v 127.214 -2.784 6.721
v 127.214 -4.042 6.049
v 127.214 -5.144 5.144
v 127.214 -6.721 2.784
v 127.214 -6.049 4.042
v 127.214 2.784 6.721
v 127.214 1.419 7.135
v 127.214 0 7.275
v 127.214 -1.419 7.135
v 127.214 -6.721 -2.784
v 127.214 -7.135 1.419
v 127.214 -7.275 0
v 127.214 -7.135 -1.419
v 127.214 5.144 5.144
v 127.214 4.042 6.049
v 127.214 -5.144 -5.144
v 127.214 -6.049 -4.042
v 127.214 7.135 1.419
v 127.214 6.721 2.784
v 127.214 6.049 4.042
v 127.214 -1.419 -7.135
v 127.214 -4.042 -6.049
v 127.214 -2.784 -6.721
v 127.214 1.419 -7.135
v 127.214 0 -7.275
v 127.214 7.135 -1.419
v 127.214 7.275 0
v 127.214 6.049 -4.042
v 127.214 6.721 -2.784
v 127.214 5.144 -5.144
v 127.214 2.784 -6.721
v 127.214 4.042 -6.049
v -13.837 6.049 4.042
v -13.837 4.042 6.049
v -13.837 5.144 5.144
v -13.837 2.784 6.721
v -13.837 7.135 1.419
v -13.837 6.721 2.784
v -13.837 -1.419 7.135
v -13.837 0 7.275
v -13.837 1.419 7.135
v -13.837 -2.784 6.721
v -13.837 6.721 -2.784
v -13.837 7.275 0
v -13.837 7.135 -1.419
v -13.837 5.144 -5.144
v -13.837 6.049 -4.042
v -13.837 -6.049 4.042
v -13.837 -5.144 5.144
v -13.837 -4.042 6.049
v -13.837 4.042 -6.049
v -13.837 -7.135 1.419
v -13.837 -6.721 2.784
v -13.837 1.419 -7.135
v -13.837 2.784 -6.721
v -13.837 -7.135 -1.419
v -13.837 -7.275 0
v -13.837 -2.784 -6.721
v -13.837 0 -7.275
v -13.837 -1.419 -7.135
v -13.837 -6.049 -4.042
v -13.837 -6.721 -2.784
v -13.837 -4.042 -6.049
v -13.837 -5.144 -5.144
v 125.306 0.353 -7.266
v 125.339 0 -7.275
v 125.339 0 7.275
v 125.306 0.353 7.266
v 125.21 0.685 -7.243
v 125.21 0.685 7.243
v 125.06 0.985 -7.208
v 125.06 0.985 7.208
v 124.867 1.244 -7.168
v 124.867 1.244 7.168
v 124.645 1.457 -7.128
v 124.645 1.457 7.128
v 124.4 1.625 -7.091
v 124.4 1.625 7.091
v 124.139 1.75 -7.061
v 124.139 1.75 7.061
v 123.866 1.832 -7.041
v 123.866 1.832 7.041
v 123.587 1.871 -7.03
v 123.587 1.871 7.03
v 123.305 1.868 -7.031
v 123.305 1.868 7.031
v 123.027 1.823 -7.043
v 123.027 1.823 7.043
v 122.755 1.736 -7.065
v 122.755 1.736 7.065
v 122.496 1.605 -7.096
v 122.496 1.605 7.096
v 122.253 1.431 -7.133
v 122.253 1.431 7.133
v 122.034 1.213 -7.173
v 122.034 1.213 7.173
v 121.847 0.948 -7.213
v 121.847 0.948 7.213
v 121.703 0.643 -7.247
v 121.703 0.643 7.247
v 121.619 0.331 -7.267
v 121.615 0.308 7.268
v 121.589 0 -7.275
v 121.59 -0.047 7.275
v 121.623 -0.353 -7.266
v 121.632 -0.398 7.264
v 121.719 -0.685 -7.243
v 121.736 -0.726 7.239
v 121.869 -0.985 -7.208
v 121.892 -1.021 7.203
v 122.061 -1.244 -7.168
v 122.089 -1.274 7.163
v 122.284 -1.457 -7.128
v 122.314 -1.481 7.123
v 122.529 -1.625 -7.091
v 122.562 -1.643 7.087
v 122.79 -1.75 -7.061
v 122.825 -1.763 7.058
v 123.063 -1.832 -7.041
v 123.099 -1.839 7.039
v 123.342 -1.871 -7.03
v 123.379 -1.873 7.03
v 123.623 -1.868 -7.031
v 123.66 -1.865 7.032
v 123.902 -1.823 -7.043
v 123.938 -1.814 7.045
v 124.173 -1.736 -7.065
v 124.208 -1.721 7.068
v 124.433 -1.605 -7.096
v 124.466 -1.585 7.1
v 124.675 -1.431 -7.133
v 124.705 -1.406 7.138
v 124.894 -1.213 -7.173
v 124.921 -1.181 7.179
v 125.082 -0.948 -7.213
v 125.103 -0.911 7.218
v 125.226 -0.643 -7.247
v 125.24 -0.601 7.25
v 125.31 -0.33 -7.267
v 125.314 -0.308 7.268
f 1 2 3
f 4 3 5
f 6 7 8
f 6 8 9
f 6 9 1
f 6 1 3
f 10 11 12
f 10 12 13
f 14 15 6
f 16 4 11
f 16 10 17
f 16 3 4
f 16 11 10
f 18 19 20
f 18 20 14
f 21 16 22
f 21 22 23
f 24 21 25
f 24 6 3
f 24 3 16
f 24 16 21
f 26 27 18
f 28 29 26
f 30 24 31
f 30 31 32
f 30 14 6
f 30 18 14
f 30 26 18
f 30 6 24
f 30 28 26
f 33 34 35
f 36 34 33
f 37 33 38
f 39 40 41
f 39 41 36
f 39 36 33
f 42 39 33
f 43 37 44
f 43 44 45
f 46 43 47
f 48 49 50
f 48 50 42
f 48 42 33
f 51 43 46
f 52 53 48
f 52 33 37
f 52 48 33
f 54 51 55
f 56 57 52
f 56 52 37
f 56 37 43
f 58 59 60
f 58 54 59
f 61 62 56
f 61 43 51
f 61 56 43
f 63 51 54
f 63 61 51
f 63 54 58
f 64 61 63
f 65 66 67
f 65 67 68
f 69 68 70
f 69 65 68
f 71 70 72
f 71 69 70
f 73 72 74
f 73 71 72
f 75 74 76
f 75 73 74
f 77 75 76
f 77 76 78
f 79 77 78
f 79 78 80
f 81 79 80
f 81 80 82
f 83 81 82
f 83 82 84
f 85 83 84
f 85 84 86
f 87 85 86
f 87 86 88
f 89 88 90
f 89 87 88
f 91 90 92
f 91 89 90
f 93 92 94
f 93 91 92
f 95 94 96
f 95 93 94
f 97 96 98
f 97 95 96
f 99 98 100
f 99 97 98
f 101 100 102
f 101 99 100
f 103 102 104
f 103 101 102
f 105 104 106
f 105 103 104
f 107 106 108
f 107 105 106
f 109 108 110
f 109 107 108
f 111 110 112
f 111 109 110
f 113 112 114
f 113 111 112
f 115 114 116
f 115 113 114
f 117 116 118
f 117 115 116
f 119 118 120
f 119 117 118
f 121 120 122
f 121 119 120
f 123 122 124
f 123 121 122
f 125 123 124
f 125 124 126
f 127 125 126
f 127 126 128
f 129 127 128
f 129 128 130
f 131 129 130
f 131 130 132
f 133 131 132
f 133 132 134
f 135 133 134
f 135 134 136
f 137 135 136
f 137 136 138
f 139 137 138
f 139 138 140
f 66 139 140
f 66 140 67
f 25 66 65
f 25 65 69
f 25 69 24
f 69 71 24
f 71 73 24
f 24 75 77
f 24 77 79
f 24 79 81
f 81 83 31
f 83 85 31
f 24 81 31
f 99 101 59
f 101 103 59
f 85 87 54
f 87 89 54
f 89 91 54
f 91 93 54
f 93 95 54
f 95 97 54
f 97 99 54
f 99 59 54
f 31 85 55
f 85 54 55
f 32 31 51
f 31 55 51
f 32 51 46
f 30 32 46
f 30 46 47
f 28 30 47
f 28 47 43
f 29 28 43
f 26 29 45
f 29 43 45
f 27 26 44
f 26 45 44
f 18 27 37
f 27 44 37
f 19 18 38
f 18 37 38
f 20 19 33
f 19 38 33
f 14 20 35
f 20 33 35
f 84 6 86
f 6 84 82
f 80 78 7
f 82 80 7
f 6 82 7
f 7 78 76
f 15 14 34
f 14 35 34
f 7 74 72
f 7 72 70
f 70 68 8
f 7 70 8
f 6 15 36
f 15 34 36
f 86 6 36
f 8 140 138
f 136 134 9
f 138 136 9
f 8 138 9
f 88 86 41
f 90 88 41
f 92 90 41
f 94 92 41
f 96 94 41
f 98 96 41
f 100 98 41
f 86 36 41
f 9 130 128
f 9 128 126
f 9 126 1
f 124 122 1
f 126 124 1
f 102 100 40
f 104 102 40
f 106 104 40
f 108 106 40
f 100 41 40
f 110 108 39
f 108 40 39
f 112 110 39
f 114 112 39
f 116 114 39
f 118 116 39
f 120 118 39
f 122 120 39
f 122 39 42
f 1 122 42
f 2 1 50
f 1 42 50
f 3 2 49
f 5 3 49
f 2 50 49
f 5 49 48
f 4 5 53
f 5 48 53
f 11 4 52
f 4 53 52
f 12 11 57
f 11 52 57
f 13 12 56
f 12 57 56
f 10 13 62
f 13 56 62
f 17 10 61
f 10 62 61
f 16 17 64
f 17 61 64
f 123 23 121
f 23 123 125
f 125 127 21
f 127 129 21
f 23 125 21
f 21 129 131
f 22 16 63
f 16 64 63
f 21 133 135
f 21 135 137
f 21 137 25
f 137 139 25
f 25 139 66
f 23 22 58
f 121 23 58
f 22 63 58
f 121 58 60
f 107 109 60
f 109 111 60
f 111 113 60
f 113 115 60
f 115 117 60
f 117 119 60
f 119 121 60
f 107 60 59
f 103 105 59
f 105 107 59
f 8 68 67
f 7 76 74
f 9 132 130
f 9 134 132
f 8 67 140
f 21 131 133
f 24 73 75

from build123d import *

# Parameters (mm, degrees)
SKETCH1_R               = 4.85
BOSS_EXTRUDE1_DEPTH     = 103.5535633
CUT_EXTRUDE1_DEPTH      = 104.780467681
CUT_EXTRUDE1_DEPTH_BACK = 104.780467681
SKETCH2_R               = 1.25
CUT_EXTRUDE2_DEPTH      = 104.78046779
CUT_EXTRUDE2_DEPTH_BACK = 104.78046779
SKETCH3_W               = 42.028968594
SKETCH3_H               = 71.494930271
SCALE1_SCALE            = 1.5


with BuildPart() as part:
    # Sketch1 → Boss-Extrude1 (new body)
    with BuildSketch(Plane(origin=(0, 0, 0), x_dir=(0, 0, -1), z_dir=(1, 0, 0))):
        Circle(SKETCH1_R)
    extrude(amount=BOSS_EXTRUDE1_DEPTH)

    # Sketch2 → Cut-Extrude1 (cut, two sides: drawn at the far end of the back side and taken through both)
    with BuildSketch(Plane.XY.offset(-CUT_EXTRUDE1_DEPTH_BACK)):
        with Locations((101.0535633, 0)):
            Circle(SKETCH2_R)
    extrude(amount=CUT_EXTRUDE1_DEPTH + CUT_EXTRUDE1_DEPTH_BACK, mode=Mode.SUBTRACT)

    # Sketch3 → Cut-Extrude2 (cut, two sides: drawn at the far end of the back side and taken through both)
    with BuildSketch(Plane(origin=(0, 0, 0), x_dir=(1, 0, 0), z_dir=(0, 1, 0)).offset(-CUT_EXTRUDE2_DEPTH_BACK)):
        with Locations((-11.495089548, 16.503222723)):
            Rectangle(SKETCH3_W, SKETCH3_H)
    extrude(amount=CUT_EXTRUDE2_DEPTH + CUT_EXTRUDE2_DEPTH_BACK, mode=Mode.SUBTRACT)


with BuildPart() as part_1:
    # Scale1: scaled about (56.231945049, 6e-09, 2.83e-07)
    add(part.part.scale(SCALE1_SCALE).moved(Location((-28.115972524, -3e-09, -1.41e-07))))


solid = part_1.part
